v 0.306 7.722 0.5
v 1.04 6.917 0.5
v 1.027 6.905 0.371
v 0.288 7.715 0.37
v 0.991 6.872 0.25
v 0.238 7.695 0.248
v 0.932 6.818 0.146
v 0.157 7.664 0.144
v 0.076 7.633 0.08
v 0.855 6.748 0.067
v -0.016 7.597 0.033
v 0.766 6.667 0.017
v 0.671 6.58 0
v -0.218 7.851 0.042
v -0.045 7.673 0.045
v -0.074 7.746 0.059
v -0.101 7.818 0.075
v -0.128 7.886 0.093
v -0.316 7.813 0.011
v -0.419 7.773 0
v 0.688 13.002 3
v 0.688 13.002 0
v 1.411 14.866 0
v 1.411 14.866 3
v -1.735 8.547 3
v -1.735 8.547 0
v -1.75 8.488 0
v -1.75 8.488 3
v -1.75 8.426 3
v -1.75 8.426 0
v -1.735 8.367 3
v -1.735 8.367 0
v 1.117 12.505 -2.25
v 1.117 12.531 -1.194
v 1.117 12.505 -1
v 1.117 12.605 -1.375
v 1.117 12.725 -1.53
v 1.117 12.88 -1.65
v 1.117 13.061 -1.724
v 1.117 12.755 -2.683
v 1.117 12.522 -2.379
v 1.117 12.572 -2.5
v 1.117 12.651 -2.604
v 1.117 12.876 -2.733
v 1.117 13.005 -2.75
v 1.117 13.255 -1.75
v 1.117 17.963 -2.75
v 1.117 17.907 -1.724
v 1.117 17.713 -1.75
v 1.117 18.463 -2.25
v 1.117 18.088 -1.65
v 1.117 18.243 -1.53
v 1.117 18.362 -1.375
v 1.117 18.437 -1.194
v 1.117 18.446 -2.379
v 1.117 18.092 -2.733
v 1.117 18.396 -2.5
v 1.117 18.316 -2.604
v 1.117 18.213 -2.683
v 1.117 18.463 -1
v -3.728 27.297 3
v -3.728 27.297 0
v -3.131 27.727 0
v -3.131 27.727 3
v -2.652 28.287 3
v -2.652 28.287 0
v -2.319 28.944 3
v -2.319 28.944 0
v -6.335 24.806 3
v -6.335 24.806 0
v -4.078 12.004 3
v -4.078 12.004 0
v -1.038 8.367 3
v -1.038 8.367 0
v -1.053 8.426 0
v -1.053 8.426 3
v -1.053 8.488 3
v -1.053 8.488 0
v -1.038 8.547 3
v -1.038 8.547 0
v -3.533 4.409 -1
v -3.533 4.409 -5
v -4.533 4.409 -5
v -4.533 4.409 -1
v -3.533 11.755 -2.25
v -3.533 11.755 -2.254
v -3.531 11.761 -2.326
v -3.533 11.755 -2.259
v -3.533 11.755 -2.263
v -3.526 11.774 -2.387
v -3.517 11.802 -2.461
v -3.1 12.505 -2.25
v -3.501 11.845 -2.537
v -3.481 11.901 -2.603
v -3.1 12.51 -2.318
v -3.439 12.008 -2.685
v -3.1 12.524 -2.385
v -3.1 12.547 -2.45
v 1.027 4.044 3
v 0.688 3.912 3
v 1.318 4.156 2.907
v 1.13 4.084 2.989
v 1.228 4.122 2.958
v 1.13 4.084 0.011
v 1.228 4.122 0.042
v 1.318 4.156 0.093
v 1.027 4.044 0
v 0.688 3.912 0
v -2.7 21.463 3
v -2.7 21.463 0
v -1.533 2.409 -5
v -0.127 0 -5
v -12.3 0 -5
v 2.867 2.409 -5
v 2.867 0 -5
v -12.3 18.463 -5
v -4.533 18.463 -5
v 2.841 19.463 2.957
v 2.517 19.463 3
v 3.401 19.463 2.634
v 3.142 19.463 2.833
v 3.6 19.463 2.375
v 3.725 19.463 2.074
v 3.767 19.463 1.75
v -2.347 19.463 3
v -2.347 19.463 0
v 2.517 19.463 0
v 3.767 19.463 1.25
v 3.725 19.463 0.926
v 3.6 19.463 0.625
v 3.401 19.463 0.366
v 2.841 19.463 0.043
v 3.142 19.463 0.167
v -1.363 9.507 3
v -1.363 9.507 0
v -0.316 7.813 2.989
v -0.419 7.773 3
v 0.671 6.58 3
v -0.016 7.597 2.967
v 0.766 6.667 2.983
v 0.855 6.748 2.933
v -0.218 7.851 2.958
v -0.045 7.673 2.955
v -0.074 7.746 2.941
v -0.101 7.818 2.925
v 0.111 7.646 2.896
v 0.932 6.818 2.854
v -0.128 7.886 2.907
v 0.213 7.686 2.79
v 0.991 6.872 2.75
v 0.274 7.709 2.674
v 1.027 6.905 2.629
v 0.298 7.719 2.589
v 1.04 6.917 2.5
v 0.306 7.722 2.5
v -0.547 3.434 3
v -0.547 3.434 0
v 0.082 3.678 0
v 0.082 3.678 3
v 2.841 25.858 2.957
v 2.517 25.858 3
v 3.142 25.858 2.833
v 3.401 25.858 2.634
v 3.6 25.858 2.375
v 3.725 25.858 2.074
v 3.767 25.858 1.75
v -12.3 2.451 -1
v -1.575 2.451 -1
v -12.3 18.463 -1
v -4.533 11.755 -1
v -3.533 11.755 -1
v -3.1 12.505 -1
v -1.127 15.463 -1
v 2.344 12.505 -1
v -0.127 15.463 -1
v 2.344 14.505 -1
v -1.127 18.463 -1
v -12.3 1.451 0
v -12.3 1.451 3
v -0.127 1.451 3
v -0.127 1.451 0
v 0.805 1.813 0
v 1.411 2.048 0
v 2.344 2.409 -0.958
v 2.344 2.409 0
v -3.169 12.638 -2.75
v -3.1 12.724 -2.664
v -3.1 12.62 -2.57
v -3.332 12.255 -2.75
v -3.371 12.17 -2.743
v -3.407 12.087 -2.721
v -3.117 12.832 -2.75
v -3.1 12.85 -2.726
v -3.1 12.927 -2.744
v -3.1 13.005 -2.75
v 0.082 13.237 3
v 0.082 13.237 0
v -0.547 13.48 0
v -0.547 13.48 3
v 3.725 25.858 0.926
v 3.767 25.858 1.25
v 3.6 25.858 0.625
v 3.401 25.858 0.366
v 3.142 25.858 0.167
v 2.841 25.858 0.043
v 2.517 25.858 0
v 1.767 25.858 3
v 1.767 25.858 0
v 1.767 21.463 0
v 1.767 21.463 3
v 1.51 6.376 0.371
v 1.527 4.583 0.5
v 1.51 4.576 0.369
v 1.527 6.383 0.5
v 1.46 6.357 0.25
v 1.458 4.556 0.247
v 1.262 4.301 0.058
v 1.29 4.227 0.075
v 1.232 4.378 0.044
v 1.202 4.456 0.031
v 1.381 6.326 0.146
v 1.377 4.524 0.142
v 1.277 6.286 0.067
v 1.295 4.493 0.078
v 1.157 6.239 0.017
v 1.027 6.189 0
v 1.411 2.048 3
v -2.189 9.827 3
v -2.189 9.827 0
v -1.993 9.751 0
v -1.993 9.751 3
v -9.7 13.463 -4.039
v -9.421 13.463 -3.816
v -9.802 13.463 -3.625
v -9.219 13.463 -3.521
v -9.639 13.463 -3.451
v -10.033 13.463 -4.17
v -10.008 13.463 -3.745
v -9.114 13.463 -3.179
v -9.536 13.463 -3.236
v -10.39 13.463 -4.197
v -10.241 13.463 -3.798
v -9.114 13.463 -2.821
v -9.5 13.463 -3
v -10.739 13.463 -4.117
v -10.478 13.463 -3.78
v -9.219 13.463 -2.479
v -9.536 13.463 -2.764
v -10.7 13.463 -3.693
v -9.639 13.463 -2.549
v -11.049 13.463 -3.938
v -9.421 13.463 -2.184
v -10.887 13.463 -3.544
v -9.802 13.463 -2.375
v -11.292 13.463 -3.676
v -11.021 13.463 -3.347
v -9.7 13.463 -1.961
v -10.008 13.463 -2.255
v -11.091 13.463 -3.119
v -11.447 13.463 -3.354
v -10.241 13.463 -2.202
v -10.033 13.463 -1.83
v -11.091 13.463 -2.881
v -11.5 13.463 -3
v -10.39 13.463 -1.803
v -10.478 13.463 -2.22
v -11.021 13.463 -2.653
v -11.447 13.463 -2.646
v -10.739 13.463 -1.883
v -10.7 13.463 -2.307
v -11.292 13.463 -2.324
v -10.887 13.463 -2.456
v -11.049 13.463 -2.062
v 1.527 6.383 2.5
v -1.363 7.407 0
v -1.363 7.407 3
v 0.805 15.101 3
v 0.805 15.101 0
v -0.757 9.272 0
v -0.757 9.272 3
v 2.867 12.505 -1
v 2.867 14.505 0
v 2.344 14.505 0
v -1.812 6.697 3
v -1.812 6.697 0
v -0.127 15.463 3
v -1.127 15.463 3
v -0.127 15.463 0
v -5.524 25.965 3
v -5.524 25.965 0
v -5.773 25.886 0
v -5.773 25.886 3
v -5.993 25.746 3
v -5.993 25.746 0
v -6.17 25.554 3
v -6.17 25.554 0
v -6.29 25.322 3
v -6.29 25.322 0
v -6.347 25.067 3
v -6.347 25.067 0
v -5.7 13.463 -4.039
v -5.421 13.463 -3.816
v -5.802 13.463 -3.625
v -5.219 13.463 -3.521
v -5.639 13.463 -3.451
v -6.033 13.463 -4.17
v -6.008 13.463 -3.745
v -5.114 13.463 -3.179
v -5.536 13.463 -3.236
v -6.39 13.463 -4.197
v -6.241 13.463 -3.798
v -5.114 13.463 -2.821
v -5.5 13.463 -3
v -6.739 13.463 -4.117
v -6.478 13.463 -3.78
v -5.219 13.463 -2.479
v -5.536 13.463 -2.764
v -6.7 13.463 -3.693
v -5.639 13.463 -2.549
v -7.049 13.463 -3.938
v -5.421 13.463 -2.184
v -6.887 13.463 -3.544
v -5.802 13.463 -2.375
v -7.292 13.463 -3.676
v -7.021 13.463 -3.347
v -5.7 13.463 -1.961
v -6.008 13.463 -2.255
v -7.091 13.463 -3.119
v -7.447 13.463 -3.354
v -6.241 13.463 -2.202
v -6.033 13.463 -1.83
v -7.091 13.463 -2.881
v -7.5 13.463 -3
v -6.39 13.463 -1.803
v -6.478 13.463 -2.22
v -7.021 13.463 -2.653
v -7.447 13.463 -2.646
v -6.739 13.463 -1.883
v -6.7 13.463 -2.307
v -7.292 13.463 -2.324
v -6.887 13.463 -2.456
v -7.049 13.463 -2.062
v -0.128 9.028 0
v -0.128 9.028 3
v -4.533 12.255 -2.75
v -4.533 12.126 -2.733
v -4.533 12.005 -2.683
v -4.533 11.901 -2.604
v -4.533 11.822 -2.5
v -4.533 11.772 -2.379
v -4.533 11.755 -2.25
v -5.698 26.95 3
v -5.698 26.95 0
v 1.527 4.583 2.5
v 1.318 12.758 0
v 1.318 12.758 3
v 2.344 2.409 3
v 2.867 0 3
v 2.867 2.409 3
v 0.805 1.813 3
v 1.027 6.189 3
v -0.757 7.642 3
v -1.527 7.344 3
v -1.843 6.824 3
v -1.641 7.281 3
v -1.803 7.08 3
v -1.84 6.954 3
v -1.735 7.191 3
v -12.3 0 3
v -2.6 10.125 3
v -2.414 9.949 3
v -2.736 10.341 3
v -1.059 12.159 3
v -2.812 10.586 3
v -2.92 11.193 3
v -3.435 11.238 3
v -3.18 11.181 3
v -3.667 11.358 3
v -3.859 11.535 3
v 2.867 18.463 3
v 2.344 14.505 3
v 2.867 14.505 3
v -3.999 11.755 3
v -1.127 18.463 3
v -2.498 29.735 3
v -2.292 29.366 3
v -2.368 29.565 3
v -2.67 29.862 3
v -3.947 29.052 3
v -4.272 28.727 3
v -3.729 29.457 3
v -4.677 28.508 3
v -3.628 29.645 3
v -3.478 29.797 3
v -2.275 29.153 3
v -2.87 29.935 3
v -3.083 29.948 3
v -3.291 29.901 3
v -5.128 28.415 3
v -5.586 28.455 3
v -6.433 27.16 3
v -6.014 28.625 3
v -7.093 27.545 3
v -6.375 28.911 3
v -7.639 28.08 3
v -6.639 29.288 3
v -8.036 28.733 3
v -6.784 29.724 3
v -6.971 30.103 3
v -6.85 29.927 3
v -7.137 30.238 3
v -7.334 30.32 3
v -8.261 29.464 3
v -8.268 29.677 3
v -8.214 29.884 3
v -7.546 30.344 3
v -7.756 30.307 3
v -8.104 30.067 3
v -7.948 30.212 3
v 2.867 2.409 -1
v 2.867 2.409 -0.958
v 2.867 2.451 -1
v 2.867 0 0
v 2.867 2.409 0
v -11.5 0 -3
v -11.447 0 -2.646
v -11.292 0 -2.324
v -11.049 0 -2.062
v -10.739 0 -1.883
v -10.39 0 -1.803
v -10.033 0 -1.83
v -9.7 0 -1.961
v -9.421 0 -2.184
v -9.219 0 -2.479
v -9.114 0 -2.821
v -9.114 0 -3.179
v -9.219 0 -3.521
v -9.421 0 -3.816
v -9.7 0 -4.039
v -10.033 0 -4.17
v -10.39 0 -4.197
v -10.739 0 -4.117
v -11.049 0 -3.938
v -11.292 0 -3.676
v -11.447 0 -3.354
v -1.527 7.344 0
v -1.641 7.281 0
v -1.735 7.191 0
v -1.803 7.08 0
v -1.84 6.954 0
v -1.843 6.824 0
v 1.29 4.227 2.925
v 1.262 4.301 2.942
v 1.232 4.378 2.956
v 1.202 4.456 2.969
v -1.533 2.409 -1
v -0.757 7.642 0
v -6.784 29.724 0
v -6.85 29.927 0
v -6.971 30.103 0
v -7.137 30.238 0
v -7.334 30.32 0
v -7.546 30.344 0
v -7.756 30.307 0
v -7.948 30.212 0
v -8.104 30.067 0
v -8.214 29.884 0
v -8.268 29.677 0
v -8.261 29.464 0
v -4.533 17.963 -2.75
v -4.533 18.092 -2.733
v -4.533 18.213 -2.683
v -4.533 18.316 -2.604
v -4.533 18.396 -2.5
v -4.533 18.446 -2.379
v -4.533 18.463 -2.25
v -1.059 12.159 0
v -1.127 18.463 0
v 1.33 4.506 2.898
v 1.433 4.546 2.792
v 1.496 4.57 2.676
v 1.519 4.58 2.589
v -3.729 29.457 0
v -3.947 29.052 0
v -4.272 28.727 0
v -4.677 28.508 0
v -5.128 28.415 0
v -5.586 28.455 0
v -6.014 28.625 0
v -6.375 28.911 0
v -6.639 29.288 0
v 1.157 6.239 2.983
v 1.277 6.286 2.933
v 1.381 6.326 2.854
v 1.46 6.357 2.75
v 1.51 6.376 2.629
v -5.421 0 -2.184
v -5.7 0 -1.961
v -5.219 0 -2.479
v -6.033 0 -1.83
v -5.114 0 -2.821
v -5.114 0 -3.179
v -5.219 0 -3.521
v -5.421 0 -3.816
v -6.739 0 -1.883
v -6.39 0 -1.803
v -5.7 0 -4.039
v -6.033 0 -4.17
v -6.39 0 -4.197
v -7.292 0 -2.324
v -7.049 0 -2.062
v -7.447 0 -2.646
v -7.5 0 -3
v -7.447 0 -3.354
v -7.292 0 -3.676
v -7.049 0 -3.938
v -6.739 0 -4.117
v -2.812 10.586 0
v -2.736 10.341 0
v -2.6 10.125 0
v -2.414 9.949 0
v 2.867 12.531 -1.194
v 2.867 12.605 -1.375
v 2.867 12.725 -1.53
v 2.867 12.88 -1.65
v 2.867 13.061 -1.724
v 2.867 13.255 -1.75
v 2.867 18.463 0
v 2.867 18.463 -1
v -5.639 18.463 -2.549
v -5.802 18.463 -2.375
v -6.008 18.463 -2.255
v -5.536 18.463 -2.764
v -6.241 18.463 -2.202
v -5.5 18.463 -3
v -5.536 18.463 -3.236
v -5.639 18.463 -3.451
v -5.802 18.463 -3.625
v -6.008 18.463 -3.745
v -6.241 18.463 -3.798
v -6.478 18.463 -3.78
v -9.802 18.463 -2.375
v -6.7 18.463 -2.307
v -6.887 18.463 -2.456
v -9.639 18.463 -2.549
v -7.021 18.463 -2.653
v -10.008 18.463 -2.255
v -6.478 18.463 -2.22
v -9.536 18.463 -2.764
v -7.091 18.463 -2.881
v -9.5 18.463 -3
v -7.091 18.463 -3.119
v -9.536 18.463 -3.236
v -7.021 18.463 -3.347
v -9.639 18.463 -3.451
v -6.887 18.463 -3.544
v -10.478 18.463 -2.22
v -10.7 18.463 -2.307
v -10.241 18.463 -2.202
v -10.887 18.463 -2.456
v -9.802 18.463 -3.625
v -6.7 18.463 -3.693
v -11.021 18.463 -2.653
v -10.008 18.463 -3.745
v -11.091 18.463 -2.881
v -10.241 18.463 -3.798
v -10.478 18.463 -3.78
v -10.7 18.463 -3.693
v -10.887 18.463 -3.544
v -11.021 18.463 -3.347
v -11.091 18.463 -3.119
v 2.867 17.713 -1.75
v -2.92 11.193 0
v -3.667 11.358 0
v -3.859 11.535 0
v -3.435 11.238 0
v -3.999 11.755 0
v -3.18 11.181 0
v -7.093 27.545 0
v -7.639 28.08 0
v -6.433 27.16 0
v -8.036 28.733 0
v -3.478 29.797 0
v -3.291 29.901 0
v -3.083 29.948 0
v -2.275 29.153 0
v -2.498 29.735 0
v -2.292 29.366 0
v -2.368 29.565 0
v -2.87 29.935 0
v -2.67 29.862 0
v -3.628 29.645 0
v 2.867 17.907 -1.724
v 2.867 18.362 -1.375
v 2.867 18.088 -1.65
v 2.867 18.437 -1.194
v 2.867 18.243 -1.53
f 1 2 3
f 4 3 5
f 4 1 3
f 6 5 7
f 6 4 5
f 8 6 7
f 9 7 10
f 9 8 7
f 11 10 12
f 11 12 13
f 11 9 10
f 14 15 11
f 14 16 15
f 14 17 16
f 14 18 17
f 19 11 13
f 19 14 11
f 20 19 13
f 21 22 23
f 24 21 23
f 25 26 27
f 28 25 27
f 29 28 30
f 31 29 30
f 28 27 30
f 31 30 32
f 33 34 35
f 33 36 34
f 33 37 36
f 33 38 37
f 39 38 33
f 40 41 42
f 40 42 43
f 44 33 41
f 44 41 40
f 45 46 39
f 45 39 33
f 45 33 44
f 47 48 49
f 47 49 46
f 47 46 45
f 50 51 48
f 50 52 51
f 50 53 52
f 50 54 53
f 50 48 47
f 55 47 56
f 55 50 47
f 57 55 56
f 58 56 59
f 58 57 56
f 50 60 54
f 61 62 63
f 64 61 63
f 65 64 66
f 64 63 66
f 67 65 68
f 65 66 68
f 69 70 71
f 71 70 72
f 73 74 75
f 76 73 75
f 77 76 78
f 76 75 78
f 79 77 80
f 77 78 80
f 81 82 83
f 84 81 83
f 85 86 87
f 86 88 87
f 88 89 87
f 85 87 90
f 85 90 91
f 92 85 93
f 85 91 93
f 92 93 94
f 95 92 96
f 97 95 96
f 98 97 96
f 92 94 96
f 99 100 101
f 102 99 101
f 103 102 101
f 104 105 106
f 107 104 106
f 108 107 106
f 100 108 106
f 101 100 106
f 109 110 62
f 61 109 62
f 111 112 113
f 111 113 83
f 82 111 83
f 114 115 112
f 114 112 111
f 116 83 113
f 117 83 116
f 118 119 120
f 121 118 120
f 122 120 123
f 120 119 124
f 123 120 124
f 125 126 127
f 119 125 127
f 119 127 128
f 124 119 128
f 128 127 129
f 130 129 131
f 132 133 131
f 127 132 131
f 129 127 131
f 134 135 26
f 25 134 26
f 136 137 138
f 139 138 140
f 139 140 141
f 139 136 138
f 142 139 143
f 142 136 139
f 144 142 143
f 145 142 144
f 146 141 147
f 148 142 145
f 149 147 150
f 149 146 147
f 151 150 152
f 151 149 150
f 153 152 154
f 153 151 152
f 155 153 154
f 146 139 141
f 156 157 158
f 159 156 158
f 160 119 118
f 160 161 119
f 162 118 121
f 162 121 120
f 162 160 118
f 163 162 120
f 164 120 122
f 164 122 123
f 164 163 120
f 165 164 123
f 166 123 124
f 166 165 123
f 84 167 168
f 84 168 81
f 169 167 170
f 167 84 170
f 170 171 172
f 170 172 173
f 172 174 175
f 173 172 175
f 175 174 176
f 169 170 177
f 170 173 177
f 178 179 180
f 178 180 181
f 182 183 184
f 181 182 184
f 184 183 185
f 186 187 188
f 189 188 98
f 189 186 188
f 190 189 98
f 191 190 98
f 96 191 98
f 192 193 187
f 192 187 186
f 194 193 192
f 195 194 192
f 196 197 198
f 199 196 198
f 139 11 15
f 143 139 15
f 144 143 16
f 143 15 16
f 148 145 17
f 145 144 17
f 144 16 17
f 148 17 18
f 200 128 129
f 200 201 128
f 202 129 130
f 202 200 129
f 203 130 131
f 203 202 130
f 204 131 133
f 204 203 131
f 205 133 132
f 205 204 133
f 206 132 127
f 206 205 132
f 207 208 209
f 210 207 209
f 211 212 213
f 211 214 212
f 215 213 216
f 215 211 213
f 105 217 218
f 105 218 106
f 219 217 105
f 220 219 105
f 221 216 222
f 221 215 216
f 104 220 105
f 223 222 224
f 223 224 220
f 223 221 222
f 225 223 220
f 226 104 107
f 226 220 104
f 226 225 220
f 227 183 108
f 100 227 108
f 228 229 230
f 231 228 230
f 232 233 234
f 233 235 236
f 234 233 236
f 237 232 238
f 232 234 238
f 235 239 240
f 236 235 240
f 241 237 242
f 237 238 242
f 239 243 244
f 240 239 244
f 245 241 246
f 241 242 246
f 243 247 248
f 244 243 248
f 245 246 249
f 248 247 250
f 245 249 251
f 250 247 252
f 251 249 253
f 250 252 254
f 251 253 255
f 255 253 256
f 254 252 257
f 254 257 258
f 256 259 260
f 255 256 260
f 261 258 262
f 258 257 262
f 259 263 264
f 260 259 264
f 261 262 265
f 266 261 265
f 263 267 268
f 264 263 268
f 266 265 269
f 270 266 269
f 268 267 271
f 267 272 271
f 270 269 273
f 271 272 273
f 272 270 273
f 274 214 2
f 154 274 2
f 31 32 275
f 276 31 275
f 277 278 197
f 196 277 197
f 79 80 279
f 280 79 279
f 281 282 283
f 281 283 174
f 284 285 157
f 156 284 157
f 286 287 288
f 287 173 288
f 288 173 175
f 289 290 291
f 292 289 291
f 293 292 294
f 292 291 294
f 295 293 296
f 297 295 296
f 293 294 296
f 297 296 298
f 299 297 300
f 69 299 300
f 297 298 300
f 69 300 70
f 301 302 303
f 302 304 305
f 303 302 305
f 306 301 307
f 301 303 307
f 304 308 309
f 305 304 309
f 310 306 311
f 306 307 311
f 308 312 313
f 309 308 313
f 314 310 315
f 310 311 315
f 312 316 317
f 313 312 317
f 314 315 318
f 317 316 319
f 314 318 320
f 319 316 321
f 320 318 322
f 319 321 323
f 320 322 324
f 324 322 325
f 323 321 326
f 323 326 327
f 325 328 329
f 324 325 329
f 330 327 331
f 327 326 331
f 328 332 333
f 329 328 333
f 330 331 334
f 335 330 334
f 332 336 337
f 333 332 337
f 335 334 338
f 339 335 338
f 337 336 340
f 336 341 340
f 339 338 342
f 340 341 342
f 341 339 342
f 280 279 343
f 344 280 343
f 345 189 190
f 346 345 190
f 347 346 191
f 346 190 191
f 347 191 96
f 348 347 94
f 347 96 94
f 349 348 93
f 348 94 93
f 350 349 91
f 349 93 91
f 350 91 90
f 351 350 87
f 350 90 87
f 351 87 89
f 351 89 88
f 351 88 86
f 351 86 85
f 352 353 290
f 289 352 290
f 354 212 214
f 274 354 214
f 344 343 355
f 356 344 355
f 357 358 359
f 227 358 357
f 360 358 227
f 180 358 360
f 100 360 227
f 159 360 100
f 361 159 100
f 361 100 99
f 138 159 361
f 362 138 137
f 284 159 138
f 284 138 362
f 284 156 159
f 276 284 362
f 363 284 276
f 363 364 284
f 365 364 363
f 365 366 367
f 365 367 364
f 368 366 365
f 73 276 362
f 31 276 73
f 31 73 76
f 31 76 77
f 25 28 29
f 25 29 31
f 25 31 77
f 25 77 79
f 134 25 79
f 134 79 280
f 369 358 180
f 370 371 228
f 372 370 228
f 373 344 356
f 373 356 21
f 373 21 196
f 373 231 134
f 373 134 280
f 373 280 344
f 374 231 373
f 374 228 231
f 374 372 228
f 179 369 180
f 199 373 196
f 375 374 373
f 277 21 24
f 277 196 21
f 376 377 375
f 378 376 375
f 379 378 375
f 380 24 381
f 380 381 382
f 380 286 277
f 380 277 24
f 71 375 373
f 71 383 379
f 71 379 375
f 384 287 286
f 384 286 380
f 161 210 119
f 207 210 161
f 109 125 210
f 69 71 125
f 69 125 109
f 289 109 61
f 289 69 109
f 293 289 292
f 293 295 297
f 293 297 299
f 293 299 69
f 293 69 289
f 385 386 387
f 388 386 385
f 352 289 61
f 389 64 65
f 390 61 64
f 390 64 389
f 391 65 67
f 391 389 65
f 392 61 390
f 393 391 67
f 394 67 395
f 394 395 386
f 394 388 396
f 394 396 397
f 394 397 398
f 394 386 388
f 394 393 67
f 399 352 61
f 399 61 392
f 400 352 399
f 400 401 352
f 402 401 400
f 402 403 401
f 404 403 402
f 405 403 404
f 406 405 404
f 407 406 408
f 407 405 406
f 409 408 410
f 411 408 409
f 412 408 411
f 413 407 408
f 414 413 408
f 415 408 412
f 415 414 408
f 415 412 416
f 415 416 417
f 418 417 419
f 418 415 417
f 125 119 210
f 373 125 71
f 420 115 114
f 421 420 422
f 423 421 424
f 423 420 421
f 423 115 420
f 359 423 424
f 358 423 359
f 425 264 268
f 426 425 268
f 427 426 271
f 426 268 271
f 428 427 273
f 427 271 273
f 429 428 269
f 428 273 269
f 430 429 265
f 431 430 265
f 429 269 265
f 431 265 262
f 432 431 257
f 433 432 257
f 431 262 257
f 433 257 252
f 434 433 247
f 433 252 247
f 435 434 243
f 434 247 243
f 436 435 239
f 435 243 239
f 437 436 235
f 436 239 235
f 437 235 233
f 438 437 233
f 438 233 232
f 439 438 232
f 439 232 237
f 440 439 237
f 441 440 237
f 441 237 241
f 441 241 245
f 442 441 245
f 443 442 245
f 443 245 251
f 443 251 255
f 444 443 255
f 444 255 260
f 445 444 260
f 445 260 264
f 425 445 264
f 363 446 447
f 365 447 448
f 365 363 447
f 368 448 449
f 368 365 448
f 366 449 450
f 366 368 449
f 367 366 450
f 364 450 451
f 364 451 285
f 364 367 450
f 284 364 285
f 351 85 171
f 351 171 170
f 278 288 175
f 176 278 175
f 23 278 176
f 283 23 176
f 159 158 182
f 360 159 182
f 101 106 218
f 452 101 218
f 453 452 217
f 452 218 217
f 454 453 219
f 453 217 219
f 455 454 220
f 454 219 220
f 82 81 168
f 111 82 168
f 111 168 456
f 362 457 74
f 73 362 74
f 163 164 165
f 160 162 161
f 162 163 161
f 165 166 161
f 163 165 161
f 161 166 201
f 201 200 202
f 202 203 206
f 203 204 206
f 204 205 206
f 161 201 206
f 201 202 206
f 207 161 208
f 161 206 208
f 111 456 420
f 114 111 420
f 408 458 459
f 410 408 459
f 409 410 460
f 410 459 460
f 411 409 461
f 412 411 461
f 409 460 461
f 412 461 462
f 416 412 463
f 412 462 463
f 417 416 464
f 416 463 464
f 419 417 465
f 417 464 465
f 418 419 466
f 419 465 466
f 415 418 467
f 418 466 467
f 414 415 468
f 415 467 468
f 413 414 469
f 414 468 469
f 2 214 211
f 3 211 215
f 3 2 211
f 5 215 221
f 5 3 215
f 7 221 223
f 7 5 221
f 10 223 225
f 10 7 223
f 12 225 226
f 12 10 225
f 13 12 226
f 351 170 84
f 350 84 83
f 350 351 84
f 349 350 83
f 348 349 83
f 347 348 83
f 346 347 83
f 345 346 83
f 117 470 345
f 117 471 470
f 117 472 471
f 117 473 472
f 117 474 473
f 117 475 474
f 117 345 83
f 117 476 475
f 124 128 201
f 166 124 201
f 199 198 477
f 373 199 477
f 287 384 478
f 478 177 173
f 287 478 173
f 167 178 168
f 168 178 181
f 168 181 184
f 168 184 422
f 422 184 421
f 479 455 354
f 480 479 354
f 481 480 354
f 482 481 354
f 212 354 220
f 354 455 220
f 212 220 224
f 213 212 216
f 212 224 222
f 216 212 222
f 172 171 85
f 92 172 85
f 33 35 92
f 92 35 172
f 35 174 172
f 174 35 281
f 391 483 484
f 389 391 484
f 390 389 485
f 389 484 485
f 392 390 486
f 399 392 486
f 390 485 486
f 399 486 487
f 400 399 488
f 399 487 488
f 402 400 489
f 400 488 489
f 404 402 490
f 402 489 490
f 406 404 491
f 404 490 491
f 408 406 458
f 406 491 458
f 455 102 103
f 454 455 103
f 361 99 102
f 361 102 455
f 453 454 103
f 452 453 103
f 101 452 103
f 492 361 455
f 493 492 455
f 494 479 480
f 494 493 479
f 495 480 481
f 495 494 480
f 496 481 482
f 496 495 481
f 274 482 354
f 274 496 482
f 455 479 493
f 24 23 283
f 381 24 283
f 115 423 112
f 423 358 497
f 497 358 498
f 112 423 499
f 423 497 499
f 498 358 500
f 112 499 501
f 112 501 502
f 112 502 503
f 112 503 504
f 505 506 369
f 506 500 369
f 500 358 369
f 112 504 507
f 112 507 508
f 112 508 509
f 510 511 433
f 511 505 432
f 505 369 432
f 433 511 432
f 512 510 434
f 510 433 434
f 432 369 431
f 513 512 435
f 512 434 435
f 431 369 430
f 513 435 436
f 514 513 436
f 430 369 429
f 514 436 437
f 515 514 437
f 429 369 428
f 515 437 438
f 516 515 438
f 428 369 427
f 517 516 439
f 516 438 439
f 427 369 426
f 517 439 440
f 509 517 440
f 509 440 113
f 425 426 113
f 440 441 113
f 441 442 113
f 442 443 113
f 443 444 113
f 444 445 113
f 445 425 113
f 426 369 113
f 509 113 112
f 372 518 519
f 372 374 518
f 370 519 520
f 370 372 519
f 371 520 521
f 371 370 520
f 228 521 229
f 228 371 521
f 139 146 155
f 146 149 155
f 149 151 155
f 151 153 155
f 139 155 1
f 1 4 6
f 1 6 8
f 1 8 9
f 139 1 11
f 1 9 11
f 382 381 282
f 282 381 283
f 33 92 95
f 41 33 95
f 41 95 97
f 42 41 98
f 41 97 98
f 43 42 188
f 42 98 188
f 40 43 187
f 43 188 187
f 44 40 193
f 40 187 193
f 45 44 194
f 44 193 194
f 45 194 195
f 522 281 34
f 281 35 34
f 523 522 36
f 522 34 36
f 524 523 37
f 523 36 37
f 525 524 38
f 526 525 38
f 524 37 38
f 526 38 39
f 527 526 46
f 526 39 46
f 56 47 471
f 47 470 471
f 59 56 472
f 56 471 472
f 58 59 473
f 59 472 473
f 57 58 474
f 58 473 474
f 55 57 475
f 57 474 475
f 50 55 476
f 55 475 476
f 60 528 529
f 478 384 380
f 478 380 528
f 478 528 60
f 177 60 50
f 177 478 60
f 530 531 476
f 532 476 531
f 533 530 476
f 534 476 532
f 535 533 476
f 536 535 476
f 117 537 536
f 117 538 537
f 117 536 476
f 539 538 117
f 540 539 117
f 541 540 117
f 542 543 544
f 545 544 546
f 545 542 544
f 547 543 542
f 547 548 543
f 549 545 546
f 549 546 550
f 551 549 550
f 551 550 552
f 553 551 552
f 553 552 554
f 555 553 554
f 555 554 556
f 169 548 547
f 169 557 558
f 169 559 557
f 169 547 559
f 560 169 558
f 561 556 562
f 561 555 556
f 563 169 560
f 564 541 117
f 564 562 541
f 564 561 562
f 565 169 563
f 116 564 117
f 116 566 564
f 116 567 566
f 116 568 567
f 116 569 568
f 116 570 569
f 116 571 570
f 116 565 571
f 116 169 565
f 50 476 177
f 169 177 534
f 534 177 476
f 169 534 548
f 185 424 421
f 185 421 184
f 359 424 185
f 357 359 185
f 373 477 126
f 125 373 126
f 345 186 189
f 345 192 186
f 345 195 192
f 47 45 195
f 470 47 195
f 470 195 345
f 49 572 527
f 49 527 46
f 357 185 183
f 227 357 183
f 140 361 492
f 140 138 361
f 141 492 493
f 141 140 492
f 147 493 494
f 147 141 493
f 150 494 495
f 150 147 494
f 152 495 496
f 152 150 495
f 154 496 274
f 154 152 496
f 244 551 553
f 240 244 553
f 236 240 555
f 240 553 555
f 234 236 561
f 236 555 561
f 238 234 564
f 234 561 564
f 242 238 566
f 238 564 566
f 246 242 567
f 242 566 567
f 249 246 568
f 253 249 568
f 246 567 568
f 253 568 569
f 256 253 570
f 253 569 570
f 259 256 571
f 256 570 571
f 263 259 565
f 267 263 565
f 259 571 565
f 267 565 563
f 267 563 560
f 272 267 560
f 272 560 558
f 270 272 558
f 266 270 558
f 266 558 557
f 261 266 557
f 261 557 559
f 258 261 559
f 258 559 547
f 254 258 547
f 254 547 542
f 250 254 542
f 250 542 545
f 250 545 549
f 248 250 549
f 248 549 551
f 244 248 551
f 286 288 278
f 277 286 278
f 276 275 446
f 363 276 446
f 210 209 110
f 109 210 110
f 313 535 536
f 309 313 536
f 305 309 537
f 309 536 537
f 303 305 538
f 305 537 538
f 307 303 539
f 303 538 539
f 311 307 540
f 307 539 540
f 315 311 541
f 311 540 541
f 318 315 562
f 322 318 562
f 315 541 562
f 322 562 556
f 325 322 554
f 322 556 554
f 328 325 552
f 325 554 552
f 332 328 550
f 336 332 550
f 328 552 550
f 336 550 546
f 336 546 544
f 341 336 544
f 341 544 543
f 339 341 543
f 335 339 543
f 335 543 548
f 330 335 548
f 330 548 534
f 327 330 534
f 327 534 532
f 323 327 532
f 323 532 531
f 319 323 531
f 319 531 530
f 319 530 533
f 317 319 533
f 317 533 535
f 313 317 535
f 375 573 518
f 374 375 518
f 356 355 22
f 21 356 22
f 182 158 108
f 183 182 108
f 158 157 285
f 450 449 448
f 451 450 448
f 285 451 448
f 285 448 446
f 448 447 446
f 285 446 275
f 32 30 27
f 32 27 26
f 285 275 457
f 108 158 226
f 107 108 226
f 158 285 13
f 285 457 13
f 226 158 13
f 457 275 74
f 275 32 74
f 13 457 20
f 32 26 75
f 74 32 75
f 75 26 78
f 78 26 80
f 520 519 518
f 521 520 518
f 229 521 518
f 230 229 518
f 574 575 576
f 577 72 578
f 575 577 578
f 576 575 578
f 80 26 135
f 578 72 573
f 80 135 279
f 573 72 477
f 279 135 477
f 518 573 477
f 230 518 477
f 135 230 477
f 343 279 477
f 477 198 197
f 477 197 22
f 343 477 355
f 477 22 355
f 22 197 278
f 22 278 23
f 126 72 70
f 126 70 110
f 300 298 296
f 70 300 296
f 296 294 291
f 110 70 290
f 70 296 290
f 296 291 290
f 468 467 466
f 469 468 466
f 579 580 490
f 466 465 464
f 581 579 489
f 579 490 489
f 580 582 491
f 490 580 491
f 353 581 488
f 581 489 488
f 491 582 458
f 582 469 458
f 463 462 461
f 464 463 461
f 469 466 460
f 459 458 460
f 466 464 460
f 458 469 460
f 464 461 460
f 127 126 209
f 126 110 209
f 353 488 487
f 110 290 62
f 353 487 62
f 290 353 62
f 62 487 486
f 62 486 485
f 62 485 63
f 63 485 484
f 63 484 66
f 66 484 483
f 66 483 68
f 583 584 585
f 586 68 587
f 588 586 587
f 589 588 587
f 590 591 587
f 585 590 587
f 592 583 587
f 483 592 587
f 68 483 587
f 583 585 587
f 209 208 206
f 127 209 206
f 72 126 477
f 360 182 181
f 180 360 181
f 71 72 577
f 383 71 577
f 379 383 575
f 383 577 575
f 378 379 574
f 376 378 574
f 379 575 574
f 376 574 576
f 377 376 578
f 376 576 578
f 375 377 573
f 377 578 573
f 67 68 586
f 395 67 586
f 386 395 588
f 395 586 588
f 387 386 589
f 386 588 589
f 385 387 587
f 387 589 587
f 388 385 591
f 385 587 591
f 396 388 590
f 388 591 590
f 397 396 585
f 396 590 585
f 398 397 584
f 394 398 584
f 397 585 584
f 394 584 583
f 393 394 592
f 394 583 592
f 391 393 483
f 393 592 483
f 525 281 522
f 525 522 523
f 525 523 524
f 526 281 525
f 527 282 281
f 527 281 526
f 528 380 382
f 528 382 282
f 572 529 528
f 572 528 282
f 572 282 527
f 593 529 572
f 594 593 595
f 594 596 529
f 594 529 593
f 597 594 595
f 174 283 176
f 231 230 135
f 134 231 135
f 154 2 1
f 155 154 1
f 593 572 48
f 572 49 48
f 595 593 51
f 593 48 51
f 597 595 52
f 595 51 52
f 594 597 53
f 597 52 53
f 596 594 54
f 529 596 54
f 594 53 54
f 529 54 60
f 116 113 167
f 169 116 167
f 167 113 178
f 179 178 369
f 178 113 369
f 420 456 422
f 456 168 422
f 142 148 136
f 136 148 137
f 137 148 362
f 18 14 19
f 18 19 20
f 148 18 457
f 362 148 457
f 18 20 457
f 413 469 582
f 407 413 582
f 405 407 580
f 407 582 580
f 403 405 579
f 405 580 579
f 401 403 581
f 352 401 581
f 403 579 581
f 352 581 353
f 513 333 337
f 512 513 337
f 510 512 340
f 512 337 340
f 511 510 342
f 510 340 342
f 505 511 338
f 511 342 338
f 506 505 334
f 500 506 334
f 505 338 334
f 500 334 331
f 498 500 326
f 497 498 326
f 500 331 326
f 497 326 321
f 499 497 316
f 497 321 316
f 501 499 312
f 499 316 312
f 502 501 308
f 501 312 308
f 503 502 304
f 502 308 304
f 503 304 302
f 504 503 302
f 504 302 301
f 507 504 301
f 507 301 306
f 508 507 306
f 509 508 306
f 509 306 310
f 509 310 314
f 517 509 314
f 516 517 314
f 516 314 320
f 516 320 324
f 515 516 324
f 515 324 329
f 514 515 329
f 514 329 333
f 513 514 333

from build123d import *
from OCP.BRepFilletAPI import BRepFilletAPI_MakeChamfer

# Parameters (mm, degrees)
BOSS_SWITCH_BODY_DEPTH                    = 3
SKETCH1_W                                 = 2.994375291
SKETCH1_H                                 = 2.409101515
SKETCH1_W_2                               = 3.994375291
SKETCH1_H_2                               = 3.957767538
BOSS_FLANGE_WIDTH_DEPTH                   = 5
BOSS_FLANGE_HEIGHT_REACH                  = 36.698
SKETCH2_W                                 = 4
SKETCH2_H                                 = 3.957767538
SKETCH2_W_2                               = 8
SKETCH2_H_2                               = 1.451333978
SKETCH17_W                                = 15.1675
SKETCH17_H                                = 4
BOSS_FLANGE_SUPPORT_DEPTH                 = 13.053634428
CUT_WALL_GAP_DEPTH                        = 1
TAP_DRILL_FOR_M2X0_4_TAP1_D               = 1.6
M2_CLEARANCE_HOLE2_D                      = 2.4
M2_CLEARANCE_HOLE2_DEPTH                  = 13.462735941
CHAMFER_FLANGE_SUPPORT_3_SIZE             = 1
FILLET1_R                                 = 1
FILLET2_R                                 = 0.5
SKETCH28_W                                = 6.4
SKETCH28_H                                = 12.095866891
CUT_PRINT_SUPPORT_CLEARANCE_DEPTH         = 33.985789077
CUT_UP_TO_DOWN_DERAILLEUR_CLEARANCE_DEPTH = 8
FILLET3_R                                 = 0.5
FILLET5_R                                 = 1.25
BOSS_EXTRUDE2_DEPTH                       = 2
FILLET7_R                                 = 0.75
SKETCH34_W                                = 1
SKETCH34_H                                = 7.345866891
CUT_EXTRUDE1_DEPTH                        = 4
CHAMFER1_SIZE                             = 2
FILLET9_R                                 = 0.5
BOSS_SUPPORT_CHAMFER_DEPTH                = 0.523509
CHAMFER3_SIZE                             = 0.433012702
CHAMFER3_SIZE_2                           = 0.75
FILLET10_R                                = 0.5


# Some blends are built 0.0001 mm under size
with BuildPart() as part:
    # Sketch-SwitchBossUp → Boss-Switch Body (new body)
    with BuildSketch(Plane.XY):
        with BuildLine():
            Line((-5.697895702, 26.949658376), (-5.524247524, 25.964850623))
            ThreePointArc((-5.524247524, 25.964850623), (-6.169751391, 25.553619307), (-6.3354071, 24.806394693))
            Line((-6.3354071, 24.806394693), (-4.07798079, 12.003893904))
            ThreePointArc((-4.07798079, 12.003893904), (-3.666749473, 11.358390037), (-2.919524859, 11.192734328))
            Line((-2.919524859, 11.192734328), (-2.714625886, 10.030694504))
            Line((-2.714625886, 10.030694504), (-1.992701385, 9.750859132))
            Line((-1.992701385, 9.750859132), (-1.363329725, 9.506899476))
            Line((-1.363329725, 9.506899476), (-1.735258621, 8.547390389))
            ThreePointArc((-1.735258621, 8.547390389), (-1.752158006, 8.457034961), (-1.735258621, 8.366679532))
            Line((-1.735258621, 8.366679532), (-1.363329725, 7.407170445))
            Line((-1.363329725, 7.407170445), (-1.992701385, 7.163210789))
            Line((-1.992701385, 7.163210789), (-0.547014535, 3.433600952))
            Line((-0.547014535, 3.433600952), (0.082357125, 3.677560608))
            Line((0.082357125, 3.677560608), (0.805200549, 1.81275569))
            Line((0.805200549, 1.81275569), (-0.12720191, 1.451333978))
            Line((-0.12720191, 1.451333978), (-0.12720191, 0))
            Line((-0.12720191, 0), (2.867173381, 0))
            Line((2.867173381, 0), (2.867173381, 2.409101515))
            Line((2.867173381, 2.409101515), (2.343664607, 2.409101515))
            Line((2.343664607, 2.409101515), (1.411262148, 2.047679803))
            Line((1.411262148, 2.047679803), (0.688418723, 3.912484721))
            Line((0.688418723, 3.912484721), (1.317790383, 4.156444377))
            Line((1.317790383, 4.156444377), (1.20154386, 4.45633932))
            Line((1.20154386, 4.45633932), (1.527349418, 4.582629423))
            Line((1.527349418, 4.582629423), (1.527349418, 6.382671008))
            Line((1.527349418, 6.382671008), (1.040012528, 6.916747279))
            Line((1.040012528, 6.916747279), (0.305600099, 7.721595547))
            Line((0.305600099, 7.721595547), (-0.015849687, 7.596993847))
            Line((-0.015849687, 7.596993847), (-0.127896466, 7.886054214))
            Line((-0.127896466, 7.886054214), (-0.757268126, 7.642094558))
            Line((-0.757268126, 7.642094558), (-1.038134762, 8.366679532))
            ThreePointArc((-1.038134762, 8.366679532), (-1.055034148, 8.457034961), (-1.038134762, 8.547390389))
            Line((-1.038134762, 8.547390389), (-0.757268126, 9.271975363))
            Line((-0.757268126, 9.271975363), (-0.127896466, 9.028015707))
            Line((-0.127896466, 9.028015707), (1.317790383, 12.757625544))
            Line((1.317790383, 12.757625544), (0.688418723, 13.0015852))
            Line((0.688418723, 13.0015852), (1.411262148, 14.866390118))
            Line((1.411262148, 14.866390118), (2.343664607, 14.504968406))
            Line((2.343664607, 14.504968406), (2.867173381, 14.504968406))
            Line((2.867173381, 14.504968406), (2.867173381, 18.462735944))
            Line((2.867173381, 18.462735944), (-0.111637615, 18.462735944))
            Line((-0.111637615, 18.462735944), (-1.12720191, 18.462735944))
            Line((-1.12720191, 18.462735944), (-1.12720191, 15.462735944))
            Line((-1.12720191, 15.462735944), (-0.12720191, 15.462735944))
            Line((-0.12720191, 15.462735944), (0.805200549, 15.101314231))
            Line((0.805200549, 15.101314231), (0.082357125, 13.236509313))
            Line((0.082357125, 13.236509313), (-0.547014535, 13.480468969))
            Line((-0.547014535, 13.480468969), (-1.059112089, 12.159350171))
            Line((-1.059112089, 12.159350171), (-2.346896051, 19.462735944))
            Line((-2.346896051, 19.462735944), (3.767173381, 19.462735944))
            Line((3.767173381, 19.462735944), (3.767173381, 25.857619356))
            Line((3.767173381, 25.857619356), (1.767173381, 25.857619356))
            Line((1.767173381, 25.857619356), (1.767173381, 21.462735944))
            Line((1.767173381, 21.462735944), (-2.699550012, 21.462735944))
            Line((-2.699550012, 21.462735944), (-3.728280196, 27.296954732))
            ThreePointArc((-3.728280196, 27.296954732), (-2.874356585, 27.992742953), (-2.319025652, 28.944012807))
            ThreePointArc((-2.319025652, 28.944012807), (-2.76728001, 29.905297381), (-3.728564583, 29.457043022))
            ThreePointArc((-3.728564583, 29.457043022), (-5.35868636, 28.418540917), (-6.783708927, 29.724333518))
            ThreePointArc((-6.783708927, 29.724333518), (-7.652550875, 30.332703199), (-8.260920556, 29.463861251))
            ThreePointArc((-8.260920556, 29.463861251), (-7.382425549, 27.795916411), (-5.697895702, 26.949658376))
        make_face()
    extrude(amount=BOSS_SWITCH_BODY_DEPTH)

    # Sketch1 → Boss-Flange Width (add)
    with BuildSketch(Plane(origin=(0, 0, 0), x_dir=(-1, 0, 0), z_dir=(0, 0, -1))):
        with Locations((-1.369985736, 1.204550758)):
            Rectangle(SKETCH1_W, SKETCH1_H)
        with Locations((-0.869985736, 16.483852175)):
            Rectangle(SKETCH1_W_2, SKETCH1_H_2)
    extrude(amount=BOSS_FLANGE_WIDTH_DEPTH)

    # Boss-Flange Height: up to this face of the body (flat: up to its plane)
    boss_flange_height_end = Plane(part.part.faces().sort_by_distance((-0.12720191, 1.077409098, -1.438016547))[0])
    # Sketch2 → Boss-Flange Height (add, up to the picked face)
    with BuildSketch(Plane(origin=(-12.300326619, 0, 0), x_dir=(0, 0, -1), z_dir=(1, 0, 0)), mode=Mode.PRIVATE) as boss_flange_height_sk1:
        with Locations((3, 16.483852175)):
            Rectangle(SKETCH2_W, SKETCH2_H)
    boss_flange_height_tool1 = split(extrude(boss_flange_height_sk1.sketch, amount=BOSS_FLANGE_HEIGHT_REACH, mode=Mode.PRIVATE), bisect_by=boss_flange_height_end, keep=Keep.BOTH, mode=Mode.PRIVATE)
    # Sketch2 → Boss-Flange Height (add, up to the picked face)
    with BuildSketch(Plane(origin=(-12.300326619, 0, 0), x_dir=(0, 0, -1), z_dir=(1, 0, 0)), mode=Mode.PRIVATE) as boss_flange_height_sk2:
        with Locations((1, 0.725666989)):
            Rectangle(SKETCH2_W_2, SKETCH2_H_2)
    boss_flange_height_tool2 = split(extrude(boss_flange_height_sk2.sketch, amount=BOSS_FLANGE_HEIGHT_REACH, mode=Mode.PRIVATE), bisect_by=boss_flange_height_end, keep=Keep.BOTH, mode=Mode.PRIVATE)
    add(boss_flange_height_tool1.solids().sort_by(Axis((-12.300327, 16.483852, -3), (1, 0, 0)))[0])
    add(boss_flange_height_tool2.solids().sort_by(Axis((-12.300327, 0.725667, -1), (1, 0, 0)))[0])

    # Sketch17 → Boss-Flange Support (add)
    with BuildSketch(Plane.XZ.offset(-1.451333978)):
        with Locations((-4.716576619, -3)):
            Rectangle(SKETCH17_W, SKETCH17_H)
    extrude(amount=-BOSS_FLANGE_SUPPORT_DEPTH)

    # Sketch27 → Cut-Wall Gap (cut)
    with BuildSketch(Plane.XY):
        Polygon((-0.12720191, 15.462735944), (2.343664607, 14.504968406), (-1.12720191, 14.504968406), (-1.12720191, 15.462735944), align=None)
        Polygon((2.343664607, 2.409101515), (-0.12720191, 2.409101515), (-0.12720191, 1.451333978), align=None)
    extrude(amount=-CUT_WALL_GAP_DEPTH, mode=Mode.SUBTRACT)

    # Tap Drill for M2x0.4 Tap1 (through all)
    with Locations(Plane(origin=(0, 0, 0), x_dir=(-1, 0, 0), z_dir=(0, -1, 0))):
        with Locations((10.300326619, 3), (6.300326619, 3)):
            Hole(TAP_DRILL_FOR_M2X0_4_TAP1_D / 2)

    # M2 Clearance Hole2
    with Locations(Plane.XZ):
        with Locations((-10.300326619, -3), (-6.300326619, -3)):
            Hole(M2_CLEARANCE_HOLE2_D / 2, depth=M2_CLEARANCE_HOLE2_DEPTH)

    # Chamfer-Flange Support 3
    chamfer_flange_support_3_edges = [part.edges().sort_by_distance(p)[0] for p in [
        (-6.213764264, 1.451333978, -1),
    ]]
    chamfer(chamfer_flange_support_3_edges, length=CHAMFER_FLANGE_SUPPORT_3_SIZE)

    # Fillet1
    fillet1_edges = [part.edges().sort_by_distance(p)[0] for p in [
        (-2.714625886, 10.030694504, 1.5),
    ]]
    fillet(fillet1_edges, radius=FILLET1_R)

    # Fillet2
    fillet2_edges = [part.edges().sort_by_distance(p)[0] for p in [
        (-1.992701385, 7.163210789, 1.5),
    ]]
    fillet(fillet2_edges, radius=FILLET2_R)

    # Sketch28 → Cut-Print Support Clearance (cut, through all)
    with BuildSketch(Plane.XY.offset(-1)):
        with Locations((-0.332826619, 8.457034961)):
            Rectangle(SKETCH28_W, SKETCH28_H)
    extrude(amount=-CUT_PRINT_SUPPORT_CLEARANCE_DEPTH, mode=Mode.SUBTRACT)

    # Sketch12 → Cut-Up-to-Down Derailleur Clearance (cut)
    with BuildSketch(Plane(origin=(0, 18.462735944, 0), x_dir=(1, 0, 0), z_dir=(0, 1, 0))):
        Polygon((2.867173381, 5), (2.867173381, 2.75), (2.867173381, 1.75), (1.117173381, 1.75), (1.117173381, 2.75), (-4.532826619, 2.75), (-4.532826619, 5), align=None)
    extrude(amount=-CUT_UP_TO_DOWN_DERAILLEUR_CLEARANCE_DEPTH, mode=Mode.SUBTRACT)

    # Fillet3
    fillet3_edges = [part.edges().sort_by_distance(p)[0] for p in [
        (1.527349418, 5.482650215, 0),
        (1.527349418, 5.482650215, 3),
        (0.916474758, 7.052133278, 0),
        (0.916474758, 7.052133278, 3),
    ]]
    fillet(fillet3_edges, radius=FILLET3_R)

    # Fillet5
    fillet5_edges = [part.edges().sort_by_distance(p)[0] for p in [
        (3.767173381, 22.66017765, 3),
        (3.767173381, 22.66017765, 0),
    ]]
    fillet(fillet5_edges, radius=FILLET5_R)

    # Sketch32 → Boss-Extrude2 (add)
    with BuildSketch(Plane.XZ.offset(-14.504968406)):
        Polygon((-3.532826619, -2.75), (-3.532826619, -1), (2.867173381, -1), (2.867173381, -1.75), (1.117173381, -1.75), (1.117173381, -2.75), align=None)
    extrude(amount=BOSS_EXTRUDE2_DEPTH)

    # Fillet7
    fillet7_edges = [part.edges().sort_by_distance(p)[0] for p in [
        (1.992173381, 12.504968406, -1.75),
        (1.992173381, 18.462735944, -1.75),
    ]]
    fillet(fillet7_edges, radius=FILLET7_R - 0.0001)  # a hair under: the kernel refuses the full size

    # Sketch34 → Cut-Extrude1 (cut)
    with BuildSketch(Plane(origin=(0, 0, -5), x_dir=(-1, 0, 0), z_dir=(0, 0, -1))):
        with Locations((4.032826619, 8.082034961)):
            Rectangle(SKETCH34_W, SKETCH34_H)
    extrude(amount=-CUT_EXTRUDE1_DEPTH, mode=Mode.SUBTRACT)

    # Chamfer1
    # the kernel refuses this chamfer: 2 mm, written as the material it adds along each edge
    with BuildSketch(Plane(origin=(-3.532826619, 2.409101515, -1), x_dir=(-0.02749587661058627, 0.9996219169112968, 0), z_dir=(0, 0, -1))) as chamfer1_piece_1_section:
        Polygon((CHAMFER1_SIZE * 0.999621916911, CHAMFER1_SIZE * 0.0274958766106), (-CHAMFER1_SIZE * 0.0274958766106, CHAMFER1_SIZE * 0.999621916911), (0, 0), align=None)
    chamfer1_piece_1 = extrude(amount=4, mode=Mode.PRIVATE)
    chamfer1_piece_1 = split(chamfer1_piece_1, bisect_by=Plane(origin=(-2.87201831, 4.409101515, -3), z_dir=(0, -1, 0)), keep=Keep.TOP, mode=Mode.PRIVATE)
    add(chamfer1_piece_1)

    # Fillet9
    fillet9_edges = [part.edges().sort_by_distance(p)[0] for p in [
        (-1.707826619, 18.462735944, -2.75),
        (-1.207826619, 12.504968406, -2.75),
    ]]
    fillet(fillet9_edges, radius=FILLET9_R)

    # Sketch33 → Boss-Support Chamfer (add)
    with BuildSketch(Plane(origin=(2.867173381, 0, 0), x_dir=(0, 0, -1), z_dir=(1, 0, 0))):
        Polygon((1, 14.504968406), (0, 14.504968406), (1, 12.504968406), align=None)
    extrude(amount=-BOSS_SUPPORT_CHAMFER_DEPTH)

    # Chamfer3
    chamfer3_edges_1 = [part.edges().sort_by_distance(p)[0] for p in [
        (-3.532826619, 12.651415015, -2.603553391),
    ]]
    chamfer3_side_1 = [part.faces().sort_by_distance(p)[0] for p in [
        (-3.524166365, 12.651415015, -2.603553391),
    ]]
    chamfer3_edges_2 = [part.edges().sort_by_distance(p)[0] for p in [
        (-3.532826619, 12.504968406, -1.625),
    ]]
    chamfer3_side_2 = [part.faces().sort_by_distance(p)[0] for p in [
        (-3.532826619, 12.496308152, -1.625),
    ]]
    chamfer3 = BRepFilletAPI_MakeChamfer(part.part.solid().wrapped)
    for e in chamfer3_edges_1:
        chamfer3.Add(CHAMFER3_SIZE - 0.0001, CHAMFER3_SIZE_2 - 0.0001, e.wrapped, chamfer3_side_1[0].wrapped)
    for e in chamfer3_edges_2:
        chamfer3.Add(CHAMFER3_SIZE_2 - 0.0001, CHAMFER3_SIZE - 0.0001, e.wrapped, chamfer3_side_2[0].wrapped)
    add(Compound.cast(chamfer3.Shape()), mode=Mode.REPLACE)  # a hair under: the kernel refuses the full size

    # Fillet10
    # the kernel refuses this fillet: 0.5 mm, written as the material it takes off along each edge
    with BuildSketch(Plane(origin=(-2.282826619, 11.754968406, -2.75), x_dir=(0, 1, 0), z_dir=(-1, 0, 0))) as fillet10_piece_1:
        with BuildLine():
            CenterArc((FILLET10_R, -FILLET10_R), FILLET10_R, 90, 90)
            Line((0, -FILLET10_R), (0, 0))
            Line((0, 0), (FILLET10_R, 0))
        make_face()
    extrude(amount=2.25, mode=Mode.SUBTRACT)


solid = part.part
